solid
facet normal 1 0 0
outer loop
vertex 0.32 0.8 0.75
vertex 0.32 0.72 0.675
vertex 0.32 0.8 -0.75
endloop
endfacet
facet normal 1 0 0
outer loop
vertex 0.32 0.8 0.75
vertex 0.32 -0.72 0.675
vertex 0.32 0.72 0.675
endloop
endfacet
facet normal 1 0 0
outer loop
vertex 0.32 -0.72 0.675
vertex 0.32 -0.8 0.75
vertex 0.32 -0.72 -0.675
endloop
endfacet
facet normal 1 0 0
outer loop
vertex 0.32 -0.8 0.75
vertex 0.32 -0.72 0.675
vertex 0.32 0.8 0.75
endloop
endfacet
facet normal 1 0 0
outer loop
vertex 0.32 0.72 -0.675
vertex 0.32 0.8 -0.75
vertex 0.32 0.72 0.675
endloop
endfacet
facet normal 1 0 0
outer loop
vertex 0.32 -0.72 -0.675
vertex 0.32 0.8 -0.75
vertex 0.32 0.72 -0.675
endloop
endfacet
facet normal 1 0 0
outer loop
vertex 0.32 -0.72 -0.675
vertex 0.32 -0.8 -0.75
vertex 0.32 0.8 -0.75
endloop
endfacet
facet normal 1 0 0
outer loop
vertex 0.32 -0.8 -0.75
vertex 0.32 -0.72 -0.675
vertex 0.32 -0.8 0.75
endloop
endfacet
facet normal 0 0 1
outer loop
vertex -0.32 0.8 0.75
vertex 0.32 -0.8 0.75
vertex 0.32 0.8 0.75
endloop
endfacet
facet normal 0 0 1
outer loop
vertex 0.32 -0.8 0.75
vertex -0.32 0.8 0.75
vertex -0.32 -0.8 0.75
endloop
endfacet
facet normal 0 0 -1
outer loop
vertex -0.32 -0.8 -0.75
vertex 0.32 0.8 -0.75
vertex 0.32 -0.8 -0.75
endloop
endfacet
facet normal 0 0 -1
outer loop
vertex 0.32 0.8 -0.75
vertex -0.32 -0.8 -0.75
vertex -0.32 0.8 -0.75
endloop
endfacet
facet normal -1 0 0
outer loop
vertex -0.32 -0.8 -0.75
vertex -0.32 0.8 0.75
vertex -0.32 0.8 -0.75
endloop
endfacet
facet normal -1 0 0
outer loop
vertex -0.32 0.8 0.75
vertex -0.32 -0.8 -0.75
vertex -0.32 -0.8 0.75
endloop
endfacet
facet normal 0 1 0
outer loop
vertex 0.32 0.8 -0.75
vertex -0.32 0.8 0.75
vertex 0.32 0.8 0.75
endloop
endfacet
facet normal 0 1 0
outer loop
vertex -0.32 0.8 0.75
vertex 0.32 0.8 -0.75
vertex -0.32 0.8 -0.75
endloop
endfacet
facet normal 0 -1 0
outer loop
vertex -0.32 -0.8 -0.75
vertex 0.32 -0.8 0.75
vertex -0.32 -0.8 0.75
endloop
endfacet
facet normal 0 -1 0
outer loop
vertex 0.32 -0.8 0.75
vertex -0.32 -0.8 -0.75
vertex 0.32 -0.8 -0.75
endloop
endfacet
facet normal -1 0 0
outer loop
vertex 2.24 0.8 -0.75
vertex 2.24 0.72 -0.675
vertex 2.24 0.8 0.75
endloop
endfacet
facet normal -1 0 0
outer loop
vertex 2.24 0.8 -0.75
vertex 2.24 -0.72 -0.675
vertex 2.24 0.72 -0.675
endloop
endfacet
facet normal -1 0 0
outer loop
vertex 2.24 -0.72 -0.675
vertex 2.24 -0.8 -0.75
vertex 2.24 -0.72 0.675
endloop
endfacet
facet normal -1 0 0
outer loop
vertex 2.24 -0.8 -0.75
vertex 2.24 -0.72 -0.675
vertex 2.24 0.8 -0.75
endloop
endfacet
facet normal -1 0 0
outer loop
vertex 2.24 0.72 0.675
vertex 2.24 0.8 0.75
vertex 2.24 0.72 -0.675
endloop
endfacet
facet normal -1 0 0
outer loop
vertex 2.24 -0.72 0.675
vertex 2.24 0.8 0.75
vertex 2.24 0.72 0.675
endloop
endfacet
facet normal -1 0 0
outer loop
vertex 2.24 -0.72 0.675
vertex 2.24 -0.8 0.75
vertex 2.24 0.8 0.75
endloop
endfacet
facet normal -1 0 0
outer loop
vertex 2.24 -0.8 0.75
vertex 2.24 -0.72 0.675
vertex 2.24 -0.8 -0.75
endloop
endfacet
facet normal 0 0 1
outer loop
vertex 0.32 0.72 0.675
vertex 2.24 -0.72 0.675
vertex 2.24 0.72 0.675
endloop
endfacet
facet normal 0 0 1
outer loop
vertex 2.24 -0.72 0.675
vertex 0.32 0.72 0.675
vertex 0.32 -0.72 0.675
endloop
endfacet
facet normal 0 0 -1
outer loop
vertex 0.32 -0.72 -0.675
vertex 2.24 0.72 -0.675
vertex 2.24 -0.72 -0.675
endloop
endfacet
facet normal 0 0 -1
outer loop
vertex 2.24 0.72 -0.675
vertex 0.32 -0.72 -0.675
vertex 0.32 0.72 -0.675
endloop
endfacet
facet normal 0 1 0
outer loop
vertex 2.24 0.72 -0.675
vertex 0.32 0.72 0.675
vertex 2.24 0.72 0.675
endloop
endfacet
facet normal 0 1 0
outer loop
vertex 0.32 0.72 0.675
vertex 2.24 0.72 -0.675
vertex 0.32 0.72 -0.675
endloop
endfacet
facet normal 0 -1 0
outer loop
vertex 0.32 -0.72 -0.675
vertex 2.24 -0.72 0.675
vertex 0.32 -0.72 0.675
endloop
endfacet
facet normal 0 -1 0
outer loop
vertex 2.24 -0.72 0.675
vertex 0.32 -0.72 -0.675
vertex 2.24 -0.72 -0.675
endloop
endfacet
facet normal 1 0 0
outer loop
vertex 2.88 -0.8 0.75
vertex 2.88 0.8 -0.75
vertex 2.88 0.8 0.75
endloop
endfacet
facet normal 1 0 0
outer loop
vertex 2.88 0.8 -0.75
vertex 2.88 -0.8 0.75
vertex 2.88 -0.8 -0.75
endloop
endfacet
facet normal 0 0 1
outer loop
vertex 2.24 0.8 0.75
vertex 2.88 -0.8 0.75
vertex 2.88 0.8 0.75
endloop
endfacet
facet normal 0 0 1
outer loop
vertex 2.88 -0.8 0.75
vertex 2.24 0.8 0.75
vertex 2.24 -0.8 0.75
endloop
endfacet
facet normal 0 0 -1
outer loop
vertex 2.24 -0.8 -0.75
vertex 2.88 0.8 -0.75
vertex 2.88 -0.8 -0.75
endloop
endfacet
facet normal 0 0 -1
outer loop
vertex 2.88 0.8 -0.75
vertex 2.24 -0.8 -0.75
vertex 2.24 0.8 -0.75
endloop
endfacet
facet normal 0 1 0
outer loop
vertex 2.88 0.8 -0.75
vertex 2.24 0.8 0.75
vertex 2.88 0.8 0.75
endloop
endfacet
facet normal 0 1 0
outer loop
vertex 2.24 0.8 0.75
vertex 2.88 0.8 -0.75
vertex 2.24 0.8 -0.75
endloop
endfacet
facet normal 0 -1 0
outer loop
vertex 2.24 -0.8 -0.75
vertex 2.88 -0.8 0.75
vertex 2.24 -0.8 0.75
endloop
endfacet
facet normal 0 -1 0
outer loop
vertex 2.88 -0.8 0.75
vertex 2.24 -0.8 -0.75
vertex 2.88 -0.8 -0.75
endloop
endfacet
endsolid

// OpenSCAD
// smd capasitors

// types are
//		0	0402 / 1005
//		1	0603 / 1608
//		2	0805 / 2012
//		3	1206 / 3216
//		4	1210 / 3225
//		5	1812 / 4532
//		6	1825 / 4564
//		7	2010 / 5025
//		8	2512 / 6332
type = 3;

l	= [1.0, 1.6, 2.0, 3.2, 3.2, 4.5, 4.5, 5.6, 5.6];
w	= [0.5, 0.8, 1.25, 1.6, 2.5, 3.2, 6.4, 5.0, 6.3];
h	= [0.55, 0.9, 1.3, 1.5, 1.7, 1.7, 1.7, 1.8, 2.0];

border = 0.2;
thin = 0.1;

color_border = [1,1,0];
color_body = [1,0,0];

x1 = l[type]*border;
x2 = l[type]*(1-border);

module smd_cap(type){

	union() translate([0,0,0]) {

	translate([0,0,0]) color(color_border) {
		cube( [ x1, w[type], h[type] ], center=true );
	}

	translate([2*x1,0,0]) color(color_body) {
		cube( [ l[type]-2*x1, w[type]*(1-thin), h[type]*(1-thin) ], center=true );
	}

	translate([x2,0,0]) color(color_border) {
		cube( [ x1, w[type], h[type] ], center=true );
	}

	} // union

}

smd_cap(type);
